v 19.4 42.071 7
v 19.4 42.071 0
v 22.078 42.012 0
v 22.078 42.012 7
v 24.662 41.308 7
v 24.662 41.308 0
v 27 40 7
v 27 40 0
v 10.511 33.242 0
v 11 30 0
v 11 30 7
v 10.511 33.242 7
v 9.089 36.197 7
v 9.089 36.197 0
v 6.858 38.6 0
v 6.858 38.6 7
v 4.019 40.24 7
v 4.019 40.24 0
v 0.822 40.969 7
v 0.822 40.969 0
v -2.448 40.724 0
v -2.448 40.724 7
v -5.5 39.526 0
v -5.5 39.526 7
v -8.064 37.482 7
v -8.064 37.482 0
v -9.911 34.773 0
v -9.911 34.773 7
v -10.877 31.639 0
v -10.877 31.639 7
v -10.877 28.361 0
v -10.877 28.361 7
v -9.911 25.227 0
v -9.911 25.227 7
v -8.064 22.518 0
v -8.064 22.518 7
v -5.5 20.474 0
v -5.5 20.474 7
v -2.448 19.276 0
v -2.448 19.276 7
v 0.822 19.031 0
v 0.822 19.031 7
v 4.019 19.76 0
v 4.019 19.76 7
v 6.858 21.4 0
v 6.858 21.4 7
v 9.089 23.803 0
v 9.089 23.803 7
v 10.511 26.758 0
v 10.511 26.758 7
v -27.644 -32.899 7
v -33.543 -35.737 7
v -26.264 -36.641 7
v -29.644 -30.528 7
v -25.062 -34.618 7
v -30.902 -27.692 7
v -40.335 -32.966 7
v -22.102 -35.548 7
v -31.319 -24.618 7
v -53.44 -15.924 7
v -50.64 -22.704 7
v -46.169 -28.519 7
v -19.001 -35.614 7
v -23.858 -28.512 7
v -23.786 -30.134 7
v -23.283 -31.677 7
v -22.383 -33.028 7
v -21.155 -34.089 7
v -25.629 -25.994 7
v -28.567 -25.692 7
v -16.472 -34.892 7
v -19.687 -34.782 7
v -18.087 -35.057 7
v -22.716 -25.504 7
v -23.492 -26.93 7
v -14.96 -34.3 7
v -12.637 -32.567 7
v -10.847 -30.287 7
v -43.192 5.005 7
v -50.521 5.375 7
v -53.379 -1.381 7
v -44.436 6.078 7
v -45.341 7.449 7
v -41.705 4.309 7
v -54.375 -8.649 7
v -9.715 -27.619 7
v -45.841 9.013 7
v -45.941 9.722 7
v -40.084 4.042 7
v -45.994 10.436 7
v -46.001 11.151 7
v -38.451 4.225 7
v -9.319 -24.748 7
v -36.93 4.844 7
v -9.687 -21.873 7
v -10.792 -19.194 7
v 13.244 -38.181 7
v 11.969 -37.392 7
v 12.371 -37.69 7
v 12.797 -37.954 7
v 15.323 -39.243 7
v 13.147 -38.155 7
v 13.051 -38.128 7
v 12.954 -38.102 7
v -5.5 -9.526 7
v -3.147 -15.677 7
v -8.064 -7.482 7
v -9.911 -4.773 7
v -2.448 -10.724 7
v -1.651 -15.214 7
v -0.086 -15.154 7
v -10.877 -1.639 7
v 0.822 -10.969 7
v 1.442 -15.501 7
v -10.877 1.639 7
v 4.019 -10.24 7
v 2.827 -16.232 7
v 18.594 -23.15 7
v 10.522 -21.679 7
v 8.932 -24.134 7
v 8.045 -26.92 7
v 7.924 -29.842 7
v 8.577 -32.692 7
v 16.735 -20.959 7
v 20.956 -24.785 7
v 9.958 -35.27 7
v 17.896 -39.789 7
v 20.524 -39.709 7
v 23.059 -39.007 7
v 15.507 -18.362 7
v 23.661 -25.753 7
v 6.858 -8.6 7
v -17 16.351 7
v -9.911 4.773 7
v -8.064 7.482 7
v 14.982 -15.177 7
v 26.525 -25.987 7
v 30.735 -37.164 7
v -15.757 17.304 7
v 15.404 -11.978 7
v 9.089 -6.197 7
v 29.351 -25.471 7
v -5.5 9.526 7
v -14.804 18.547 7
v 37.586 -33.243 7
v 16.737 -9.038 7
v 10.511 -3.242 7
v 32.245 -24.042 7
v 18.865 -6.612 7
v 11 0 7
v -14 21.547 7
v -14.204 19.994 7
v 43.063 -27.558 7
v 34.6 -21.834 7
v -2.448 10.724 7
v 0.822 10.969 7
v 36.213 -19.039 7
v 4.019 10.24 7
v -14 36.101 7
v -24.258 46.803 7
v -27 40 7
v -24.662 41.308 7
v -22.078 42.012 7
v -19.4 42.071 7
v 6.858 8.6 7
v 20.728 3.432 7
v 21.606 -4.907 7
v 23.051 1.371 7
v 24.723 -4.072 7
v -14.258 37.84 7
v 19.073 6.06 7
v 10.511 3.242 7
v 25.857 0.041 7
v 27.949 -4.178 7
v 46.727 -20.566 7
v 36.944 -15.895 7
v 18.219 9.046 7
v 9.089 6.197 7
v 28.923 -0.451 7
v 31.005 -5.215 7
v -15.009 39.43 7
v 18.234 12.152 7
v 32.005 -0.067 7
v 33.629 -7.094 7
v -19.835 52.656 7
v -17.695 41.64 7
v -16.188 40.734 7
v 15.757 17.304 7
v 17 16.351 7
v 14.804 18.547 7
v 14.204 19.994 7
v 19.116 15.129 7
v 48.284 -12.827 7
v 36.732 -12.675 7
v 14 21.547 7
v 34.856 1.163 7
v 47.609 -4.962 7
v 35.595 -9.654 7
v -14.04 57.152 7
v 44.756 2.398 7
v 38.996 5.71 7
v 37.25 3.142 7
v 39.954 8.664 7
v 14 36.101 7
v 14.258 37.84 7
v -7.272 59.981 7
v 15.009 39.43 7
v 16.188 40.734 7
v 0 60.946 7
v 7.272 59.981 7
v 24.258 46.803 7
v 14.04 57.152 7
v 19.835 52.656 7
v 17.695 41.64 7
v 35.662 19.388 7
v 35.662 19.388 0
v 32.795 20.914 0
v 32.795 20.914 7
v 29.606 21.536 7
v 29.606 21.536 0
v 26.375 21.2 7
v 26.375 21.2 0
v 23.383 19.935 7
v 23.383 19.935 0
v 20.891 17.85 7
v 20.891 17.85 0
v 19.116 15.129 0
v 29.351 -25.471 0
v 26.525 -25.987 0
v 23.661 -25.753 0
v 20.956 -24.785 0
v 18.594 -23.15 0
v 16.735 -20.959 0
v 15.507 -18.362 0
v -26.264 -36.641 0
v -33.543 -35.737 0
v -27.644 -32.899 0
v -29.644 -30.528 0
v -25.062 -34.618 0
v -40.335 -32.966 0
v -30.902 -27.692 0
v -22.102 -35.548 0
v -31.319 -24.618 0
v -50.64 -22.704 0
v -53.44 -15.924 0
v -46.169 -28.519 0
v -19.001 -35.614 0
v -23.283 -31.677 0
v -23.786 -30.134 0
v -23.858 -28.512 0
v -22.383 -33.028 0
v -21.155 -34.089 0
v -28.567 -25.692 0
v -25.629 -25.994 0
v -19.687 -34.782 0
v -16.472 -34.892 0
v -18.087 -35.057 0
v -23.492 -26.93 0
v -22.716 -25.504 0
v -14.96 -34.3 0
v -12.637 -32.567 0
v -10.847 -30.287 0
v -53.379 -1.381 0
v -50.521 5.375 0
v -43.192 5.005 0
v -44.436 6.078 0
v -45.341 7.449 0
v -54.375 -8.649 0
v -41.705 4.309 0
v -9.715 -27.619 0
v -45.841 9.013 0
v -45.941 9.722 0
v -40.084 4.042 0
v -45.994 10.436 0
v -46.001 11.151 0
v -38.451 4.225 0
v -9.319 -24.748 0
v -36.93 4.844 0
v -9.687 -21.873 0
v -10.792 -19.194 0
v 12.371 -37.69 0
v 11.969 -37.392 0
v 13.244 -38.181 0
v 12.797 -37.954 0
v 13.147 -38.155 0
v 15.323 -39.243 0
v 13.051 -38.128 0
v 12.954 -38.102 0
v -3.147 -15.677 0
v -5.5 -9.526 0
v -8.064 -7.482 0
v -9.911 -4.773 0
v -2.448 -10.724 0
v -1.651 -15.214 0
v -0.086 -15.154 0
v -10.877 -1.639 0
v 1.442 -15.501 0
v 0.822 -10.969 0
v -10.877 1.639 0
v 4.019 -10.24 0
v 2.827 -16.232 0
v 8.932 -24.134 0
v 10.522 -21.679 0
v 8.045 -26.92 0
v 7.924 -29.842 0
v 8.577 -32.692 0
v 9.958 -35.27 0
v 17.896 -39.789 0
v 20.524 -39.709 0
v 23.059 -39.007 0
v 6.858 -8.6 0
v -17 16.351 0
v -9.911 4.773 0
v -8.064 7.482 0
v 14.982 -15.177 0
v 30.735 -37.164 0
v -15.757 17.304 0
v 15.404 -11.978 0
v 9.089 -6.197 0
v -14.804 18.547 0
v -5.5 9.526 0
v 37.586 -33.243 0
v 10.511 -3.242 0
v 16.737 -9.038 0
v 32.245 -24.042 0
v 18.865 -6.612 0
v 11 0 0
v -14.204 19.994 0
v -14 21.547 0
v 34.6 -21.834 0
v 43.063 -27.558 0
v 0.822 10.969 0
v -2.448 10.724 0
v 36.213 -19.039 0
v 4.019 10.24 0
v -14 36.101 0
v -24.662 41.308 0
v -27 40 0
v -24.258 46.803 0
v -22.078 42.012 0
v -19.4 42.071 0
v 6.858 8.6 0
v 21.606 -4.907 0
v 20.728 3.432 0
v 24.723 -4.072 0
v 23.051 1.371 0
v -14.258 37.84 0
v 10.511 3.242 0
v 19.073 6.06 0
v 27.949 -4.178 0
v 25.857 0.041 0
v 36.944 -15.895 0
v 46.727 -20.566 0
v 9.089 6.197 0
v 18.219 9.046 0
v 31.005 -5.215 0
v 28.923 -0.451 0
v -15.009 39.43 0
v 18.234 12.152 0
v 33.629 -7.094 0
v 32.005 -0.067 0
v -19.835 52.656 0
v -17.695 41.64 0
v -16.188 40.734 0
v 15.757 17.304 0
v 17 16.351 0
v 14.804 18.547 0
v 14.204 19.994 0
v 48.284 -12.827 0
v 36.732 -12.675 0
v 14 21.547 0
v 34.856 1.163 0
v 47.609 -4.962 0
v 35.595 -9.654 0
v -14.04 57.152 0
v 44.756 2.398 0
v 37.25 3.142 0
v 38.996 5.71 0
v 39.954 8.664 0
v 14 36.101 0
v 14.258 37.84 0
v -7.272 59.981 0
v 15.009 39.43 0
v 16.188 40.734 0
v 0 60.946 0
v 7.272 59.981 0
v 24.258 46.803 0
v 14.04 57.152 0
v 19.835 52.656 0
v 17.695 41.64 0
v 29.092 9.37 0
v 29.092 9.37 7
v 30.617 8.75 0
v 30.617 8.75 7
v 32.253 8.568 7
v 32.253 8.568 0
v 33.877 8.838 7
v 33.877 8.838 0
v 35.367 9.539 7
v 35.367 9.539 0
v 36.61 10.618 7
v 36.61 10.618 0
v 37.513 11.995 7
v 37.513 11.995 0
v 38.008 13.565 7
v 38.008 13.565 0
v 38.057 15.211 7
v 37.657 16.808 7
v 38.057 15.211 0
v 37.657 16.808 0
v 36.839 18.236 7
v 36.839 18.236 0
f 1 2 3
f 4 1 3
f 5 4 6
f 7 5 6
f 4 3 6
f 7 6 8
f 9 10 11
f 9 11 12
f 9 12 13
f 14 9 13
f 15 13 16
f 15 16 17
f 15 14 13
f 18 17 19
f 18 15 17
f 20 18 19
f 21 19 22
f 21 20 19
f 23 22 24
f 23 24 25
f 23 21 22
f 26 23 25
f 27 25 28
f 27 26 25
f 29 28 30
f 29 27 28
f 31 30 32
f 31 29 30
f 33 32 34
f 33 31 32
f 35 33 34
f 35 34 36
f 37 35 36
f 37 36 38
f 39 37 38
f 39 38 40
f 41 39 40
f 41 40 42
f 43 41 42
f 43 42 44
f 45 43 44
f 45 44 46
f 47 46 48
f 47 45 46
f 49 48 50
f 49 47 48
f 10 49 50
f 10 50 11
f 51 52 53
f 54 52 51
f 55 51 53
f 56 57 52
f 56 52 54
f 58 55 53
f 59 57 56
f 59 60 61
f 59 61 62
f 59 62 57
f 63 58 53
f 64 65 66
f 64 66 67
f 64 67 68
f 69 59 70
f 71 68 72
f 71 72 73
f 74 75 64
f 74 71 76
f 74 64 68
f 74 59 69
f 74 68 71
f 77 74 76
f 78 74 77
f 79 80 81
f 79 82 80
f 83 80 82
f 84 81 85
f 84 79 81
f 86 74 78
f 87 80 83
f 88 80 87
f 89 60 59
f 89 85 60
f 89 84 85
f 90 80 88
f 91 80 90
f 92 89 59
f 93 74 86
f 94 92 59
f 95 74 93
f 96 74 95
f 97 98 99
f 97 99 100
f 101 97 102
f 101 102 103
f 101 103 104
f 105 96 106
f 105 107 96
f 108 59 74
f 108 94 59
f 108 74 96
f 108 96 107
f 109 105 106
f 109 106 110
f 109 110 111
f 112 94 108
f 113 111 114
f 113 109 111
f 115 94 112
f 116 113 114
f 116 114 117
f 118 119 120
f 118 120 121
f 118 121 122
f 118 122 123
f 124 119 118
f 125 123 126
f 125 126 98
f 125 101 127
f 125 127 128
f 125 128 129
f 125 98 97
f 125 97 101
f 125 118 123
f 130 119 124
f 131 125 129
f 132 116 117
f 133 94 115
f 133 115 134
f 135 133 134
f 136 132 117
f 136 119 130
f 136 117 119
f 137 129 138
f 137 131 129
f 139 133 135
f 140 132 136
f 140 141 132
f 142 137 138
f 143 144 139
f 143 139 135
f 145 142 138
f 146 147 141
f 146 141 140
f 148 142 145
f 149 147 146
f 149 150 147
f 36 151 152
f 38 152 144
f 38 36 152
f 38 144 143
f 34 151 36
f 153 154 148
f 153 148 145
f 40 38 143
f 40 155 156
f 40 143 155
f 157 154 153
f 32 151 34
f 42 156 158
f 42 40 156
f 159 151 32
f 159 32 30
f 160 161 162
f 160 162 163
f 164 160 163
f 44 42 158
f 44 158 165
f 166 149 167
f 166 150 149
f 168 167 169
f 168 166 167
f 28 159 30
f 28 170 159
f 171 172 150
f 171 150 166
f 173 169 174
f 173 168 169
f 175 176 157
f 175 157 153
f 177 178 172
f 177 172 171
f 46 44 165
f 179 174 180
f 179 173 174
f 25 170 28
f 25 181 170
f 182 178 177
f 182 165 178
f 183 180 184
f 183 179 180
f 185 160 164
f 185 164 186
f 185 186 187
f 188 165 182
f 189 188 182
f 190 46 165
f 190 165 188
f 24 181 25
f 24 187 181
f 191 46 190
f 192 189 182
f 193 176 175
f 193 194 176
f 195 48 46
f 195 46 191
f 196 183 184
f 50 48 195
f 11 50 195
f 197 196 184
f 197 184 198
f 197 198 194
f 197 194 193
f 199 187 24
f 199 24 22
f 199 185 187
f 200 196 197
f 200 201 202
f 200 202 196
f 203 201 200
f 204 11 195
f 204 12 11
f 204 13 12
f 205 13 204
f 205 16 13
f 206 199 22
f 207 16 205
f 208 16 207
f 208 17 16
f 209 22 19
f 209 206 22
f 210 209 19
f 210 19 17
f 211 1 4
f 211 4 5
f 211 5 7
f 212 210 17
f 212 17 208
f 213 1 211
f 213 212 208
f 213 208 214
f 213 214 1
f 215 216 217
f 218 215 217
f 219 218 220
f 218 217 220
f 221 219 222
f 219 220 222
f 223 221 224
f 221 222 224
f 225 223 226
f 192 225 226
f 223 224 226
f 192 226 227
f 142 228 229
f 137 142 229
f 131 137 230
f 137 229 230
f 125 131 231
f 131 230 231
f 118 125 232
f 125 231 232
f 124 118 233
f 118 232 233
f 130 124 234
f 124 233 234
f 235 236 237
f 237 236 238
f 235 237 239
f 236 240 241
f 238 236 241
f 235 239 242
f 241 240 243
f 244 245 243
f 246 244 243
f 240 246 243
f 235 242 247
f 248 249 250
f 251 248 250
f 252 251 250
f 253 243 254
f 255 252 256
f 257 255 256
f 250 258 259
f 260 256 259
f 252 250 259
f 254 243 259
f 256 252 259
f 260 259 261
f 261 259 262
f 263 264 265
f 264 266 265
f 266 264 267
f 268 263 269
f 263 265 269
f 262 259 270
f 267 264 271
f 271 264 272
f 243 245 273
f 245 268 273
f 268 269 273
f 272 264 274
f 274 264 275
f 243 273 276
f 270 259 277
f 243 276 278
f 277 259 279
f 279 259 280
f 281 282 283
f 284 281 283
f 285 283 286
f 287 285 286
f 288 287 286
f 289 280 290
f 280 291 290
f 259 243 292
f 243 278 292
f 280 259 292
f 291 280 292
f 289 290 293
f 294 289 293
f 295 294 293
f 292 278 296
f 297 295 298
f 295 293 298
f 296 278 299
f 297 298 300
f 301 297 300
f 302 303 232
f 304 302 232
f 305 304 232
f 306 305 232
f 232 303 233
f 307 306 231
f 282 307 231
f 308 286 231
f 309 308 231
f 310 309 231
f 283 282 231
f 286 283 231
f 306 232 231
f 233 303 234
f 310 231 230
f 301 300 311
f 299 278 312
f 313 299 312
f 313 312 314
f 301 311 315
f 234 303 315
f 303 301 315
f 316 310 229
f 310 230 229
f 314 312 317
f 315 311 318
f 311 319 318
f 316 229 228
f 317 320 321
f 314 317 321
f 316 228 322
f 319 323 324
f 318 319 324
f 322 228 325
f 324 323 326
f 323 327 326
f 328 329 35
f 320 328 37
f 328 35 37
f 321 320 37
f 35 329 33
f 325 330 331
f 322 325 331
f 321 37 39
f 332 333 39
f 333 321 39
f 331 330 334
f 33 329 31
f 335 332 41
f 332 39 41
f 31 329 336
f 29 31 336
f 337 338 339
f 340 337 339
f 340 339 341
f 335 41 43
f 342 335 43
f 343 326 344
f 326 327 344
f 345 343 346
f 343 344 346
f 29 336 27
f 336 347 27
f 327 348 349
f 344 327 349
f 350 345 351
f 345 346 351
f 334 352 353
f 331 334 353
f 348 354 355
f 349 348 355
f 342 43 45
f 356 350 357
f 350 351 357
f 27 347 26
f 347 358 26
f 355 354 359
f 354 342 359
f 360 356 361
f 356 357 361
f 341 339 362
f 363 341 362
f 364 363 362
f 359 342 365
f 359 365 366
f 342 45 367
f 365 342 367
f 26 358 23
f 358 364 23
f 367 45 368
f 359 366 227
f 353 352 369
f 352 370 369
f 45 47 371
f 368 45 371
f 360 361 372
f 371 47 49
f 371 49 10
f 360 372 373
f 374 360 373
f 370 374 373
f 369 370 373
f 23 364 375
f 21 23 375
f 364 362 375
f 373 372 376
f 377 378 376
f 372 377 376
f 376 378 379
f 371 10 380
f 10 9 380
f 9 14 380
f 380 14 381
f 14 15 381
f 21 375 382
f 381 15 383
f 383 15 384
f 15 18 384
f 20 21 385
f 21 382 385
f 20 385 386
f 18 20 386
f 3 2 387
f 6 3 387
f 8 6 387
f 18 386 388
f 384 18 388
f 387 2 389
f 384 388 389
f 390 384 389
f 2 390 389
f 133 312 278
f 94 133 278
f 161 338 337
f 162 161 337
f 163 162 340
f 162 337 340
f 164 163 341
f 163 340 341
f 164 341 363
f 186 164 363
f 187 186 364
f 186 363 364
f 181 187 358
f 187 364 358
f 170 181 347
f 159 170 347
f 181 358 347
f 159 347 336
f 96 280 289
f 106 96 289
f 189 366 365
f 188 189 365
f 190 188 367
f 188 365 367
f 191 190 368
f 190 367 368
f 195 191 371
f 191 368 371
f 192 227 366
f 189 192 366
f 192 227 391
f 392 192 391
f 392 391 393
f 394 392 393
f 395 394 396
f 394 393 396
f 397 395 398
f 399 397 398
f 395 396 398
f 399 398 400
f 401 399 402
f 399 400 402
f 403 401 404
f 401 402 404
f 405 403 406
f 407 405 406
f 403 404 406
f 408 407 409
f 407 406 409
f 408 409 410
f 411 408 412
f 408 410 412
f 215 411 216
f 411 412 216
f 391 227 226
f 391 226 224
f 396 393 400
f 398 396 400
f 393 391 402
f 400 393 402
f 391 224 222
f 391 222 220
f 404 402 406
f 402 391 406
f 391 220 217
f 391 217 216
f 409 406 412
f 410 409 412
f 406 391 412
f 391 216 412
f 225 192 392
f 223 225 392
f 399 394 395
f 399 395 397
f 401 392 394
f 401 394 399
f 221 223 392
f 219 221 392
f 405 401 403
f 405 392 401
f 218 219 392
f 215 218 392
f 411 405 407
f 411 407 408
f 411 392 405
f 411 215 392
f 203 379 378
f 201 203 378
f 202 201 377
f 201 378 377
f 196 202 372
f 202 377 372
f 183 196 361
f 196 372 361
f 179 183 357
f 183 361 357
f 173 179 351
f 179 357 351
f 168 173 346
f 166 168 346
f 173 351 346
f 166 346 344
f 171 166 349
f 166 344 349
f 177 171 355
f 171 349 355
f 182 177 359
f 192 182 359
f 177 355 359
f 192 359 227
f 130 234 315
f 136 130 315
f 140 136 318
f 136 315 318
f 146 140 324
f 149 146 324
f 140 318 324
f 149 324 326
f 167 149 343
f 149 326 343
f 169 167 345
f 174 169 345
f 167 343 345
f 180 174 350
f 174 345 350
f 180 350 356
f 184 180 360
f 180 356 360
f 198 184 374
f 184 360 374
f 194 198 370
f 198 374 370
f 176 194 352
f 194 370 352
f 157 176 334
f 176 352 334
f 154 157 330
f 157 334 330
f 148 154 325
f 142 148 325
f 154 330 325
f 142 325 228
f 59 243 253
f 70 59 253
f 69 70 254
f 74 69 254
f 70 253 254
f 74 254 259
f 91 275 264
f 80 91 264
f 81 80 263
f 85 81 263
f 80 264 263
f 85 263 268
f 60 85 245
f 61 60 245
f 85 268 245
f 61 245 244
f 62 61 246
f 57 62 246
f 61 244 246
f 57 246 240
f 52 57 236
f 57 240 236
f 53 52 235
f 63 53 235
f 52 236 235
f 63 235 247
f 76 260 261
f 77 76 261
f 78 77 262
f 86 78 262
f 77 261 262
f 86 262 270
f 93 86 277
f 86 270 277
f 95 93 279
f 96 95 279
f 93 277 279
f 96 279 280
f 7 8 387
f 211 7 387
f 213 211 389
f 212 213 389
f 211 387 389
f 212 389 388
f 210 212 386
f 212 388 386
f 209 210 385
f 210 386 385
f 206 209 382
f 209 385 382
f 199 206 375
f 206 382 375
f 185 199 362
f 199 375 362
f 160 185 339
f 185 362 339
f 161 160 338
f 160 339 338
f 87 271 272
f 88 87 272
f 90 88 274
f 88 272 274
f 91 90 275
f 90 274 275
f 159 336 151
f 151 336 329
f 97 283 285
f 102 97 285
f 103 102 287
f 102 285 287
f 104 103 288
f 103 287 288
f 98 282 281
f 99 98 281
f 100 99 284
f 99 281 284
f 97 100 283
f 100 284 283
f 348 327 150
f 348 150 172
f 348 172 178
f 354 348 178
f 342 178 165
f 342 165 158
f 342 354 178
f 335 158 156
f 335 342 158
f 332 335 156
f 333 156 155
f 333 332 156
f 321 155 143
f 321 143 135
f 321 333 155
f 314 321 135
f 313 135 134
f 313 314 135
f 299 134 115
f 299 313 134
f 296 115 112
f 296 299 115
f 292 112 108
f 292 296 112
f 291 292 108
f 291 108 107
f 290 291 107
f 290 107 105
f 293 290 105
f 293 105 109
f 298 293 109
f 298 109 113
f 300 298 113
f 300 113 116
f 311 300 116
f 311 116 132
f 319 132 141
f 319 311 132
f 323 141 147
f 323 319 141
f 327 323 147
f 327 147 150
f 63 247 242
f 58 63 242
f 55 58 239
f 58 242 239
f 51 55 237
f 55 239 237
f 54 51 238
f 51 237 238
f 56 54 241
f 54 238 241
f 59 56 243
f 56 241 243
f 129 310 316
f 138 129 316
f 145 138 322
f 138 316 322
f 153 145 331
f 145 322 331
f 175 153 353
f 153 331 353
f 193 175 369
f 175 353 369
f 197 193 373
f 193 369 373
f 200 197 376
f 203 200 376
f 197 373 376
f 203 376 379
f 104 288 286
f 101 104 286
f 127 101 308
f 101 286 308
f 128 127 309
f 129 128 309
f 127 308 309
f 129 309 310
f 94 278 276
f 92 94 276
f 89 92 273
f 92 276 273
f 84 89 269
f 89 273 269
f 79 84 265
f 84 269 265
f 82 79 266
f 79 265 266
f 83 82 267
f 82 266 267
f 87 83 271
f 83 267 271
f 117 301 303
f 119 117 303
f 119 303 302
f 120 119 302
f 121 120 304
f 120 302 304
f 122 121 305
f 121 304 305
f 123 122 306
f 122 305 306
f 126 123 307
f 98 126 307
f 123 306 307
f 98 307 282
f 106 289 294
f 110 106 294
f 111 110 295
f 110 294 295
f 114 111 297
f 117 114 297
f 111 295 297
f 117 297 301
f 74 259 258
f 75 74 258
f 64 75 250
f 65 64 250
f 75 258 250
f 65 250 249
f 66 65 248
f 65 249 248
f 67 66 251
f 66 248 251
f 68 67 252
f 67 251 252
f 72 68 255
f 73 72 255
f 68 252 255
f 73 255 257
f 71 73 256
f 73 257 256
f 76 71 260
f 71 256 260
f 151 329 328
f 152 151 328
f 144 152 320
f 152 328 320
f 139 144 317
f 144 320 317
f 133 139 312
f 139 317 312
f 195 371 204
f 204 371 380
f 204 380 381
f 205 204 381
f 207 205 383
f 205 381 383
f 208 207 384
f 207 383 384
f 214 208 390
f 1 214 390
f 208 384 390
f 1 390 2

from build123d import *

# Parameters (mm, degrees)
F0_R     = 11
F1_DEPTH = 7


# Not quite as in the source:
# - a feature of the source that left no trace in its solid (it failed there, or was rolled back) is left out


with BuildPart() as f1:
    # F0 (on Top) → F1 (new body)
    with BuildSketch(Plane.XY):
        with BuildLine():
            ThreePointArc((-14.9810198925, -15.0753065176), (-14.9808265585, -15.0376534794), (-14.9807621135, -15))
            ThreePointArc((-14.9807621135, -15), (-31.5612257999, -5.5206316115), (-31.3186575763, -24.6180492839))
            ThreePointArc((-31.3186575763, -24.6180492839), (-25.8668980567, -15.1949407788), (-14.9810198925, -15.0753065176))
        make_face()
        with BuildLine():
            ThreePointArc((-31.3186575763, -24.6180492839), (-31.5612257999, -5.5206316115), (-14.9807621135, -15))
            ThreePointArc((-14.9807621135, -15), (-14.9808265585, -15.0376534794), (-14.9810198925, -15.0753065176))
            ThreePointArc((-14.9810198925, -15.0753065176), (-12.6066127008, -16.8498624622), (-10.7922626222, -19.1940024121))
            Line((-10.7922626222, -19.1940024121), (-3.1471315948, -15.6774235403))
            ThreePointArc((-3.1471315948, -15.6774235403), (-0.0857175759, -15.1540545193), (2.8272292465, -16.231510661))
            Line((2.8272292465, -16.231510661), (10.5215510319, -21.6791304199))
            ThreePointArc((10.5215510319, -21.6791304199), (12.7842474134, -19.6747261792), (15.5070984162, -18.3618995755))
            ThreePointArc((15.5070984162, -18.3618995755), (24.2793363394, -4.1323806501), (36.9807621135, -15))
            ThreePointArc((36.9807621135, -15), (34.8711182406, -21.4777749215), (29.3513861257, -25.470859266))
            ThreePointArc((29.3513861257, -25.470859266), (28.8526132199, -33.4697356256), (23.0588387456, -39.0071515183))
            ThreePointArc((23.0588387456, -39.0071515183), (46.7268088994, -20.5659720475), (39.9540974013, 8.6638122562))
            ThreePointArc((39.9540974013, 8.6638122562), (25.8569369314, 0.0414243654), (19.1161667268, 15.1290856588))
            Line((19.1161667268, 15.1290856588), (17, 16.3508550882))
            ThreePointArc((17, 16.3508550882), (14.8038475773, 18.5470075109), (14, 21.5470075109))
            Line((14, 21.5470075109), (14, 36.1008175109))
            ThreePointArc((14, 36.1008175109), (15.5502809077, 40.1257398704), (19.4, 42.0707421335))
            ThreePointArc((19.4, 42.0707421335), (23.3917111277, 41.73898575), (27, 40))
            ThreePointArc((27, 40), (0, 60.9456692242), (-27, 40))
            ThreePointArc((-27, 40), (-23.3917111277, 41.73898575), (-19.4, 42.0707421335))
            ThreePointArc((-19.4, 42.0707421335), (-15.5502809077, 40.1257398704), (-14, 36.1008175109))
            Line((-14, 36.1008175109), (-14, 21.5470075109))
            ThreePointArc((-14, 21.5470075109), (-14.8038475773, 18.5470075109), (-17, 16.3508550882))
            Line((-17, 16.3508550882), (-36.9299341095, 4.8443022651))
            ThreePointArc((-36.9299341095, 4.8443022651), (-42.4725061765, 4.6058132751), (-45.8413922703, 9.0134871064))
            ThreePointArc((-45.8413922703, 9.0134871064), (-45.9732793063, 10.0784919978), (-46.000762454, 11.1512800876))
            ThreePointArc((-46.000762454, 11.1512800876), (-50.6402441015, -22.7042404267), (-19.000762454, -35.6140917168))
            ThreePointArc((-19.000762454, -35.6140917168), (-27.6443184319, -32.8993578589), (-31.3186575763, -24.6180492839))
        make_face()
        Circle(F0_R, mode=Mode.SUBTRACT)
        with Locations((0, 30)):
            Circle(F0_R, mode=Mode.SUBTRACT)
        with BuildLine():
            ThreePointArc((-14.9810198925, -15.0753065176), (-25.8668980567, -15.1949407788), (-31.3186575763, -24.6180492839))
            ThreePointArc((-31.3186575763, -24.6180492839), (-27.1082014874, -25.9420692951), (-22.7162279438, -25.5044189109))
            ThreePointArc((-22.7162279438, -25.5044189109), (-21.6737707093, -24.4089875601), (-20.3905407876, -23.6089826237))
            Line((-20.3905407876, -23.6089826237), (-17.9001022816, -22.4634400032))
            ThreePointArc((-17.9001022816, -22.4634400032), (-15.7503386264, -19.0420830366), (-14.9810198925, -15.0753065176))
        make_face()
        with BuildLine():
            ThreePointArc((-10.7922626222, -19.1940024121), (-12.6066127008, -16.8498624622), (-14.9810198925, -15.0753065176))
            ThreePointArc((-14.9810198925, -15.0753065176), (-15.7503386264, -19.0420830366), (-17.9001022816, -22.4634400032))
            Line((-17.9001022816, -22.4634400032), (-10.7922626222, -19.1940024121))
        make_face()
        with BuildLine():
            ThreePointArc((-20.3905407876, -23.6089826237), (-21.6737707093, -24.4089875601), (-22.7162279438, -25.5044189109))
            ThreePointArc((-22.7162279438, -25.5044189109), (-20.1079225182, -24.3010620408), (-17.9001022816, -22.4634400032))
            Line((-17.9001022816, -22.4634400032), (-20.3905407876, -23.6089826237))
        make_face()
        with BuildLine():
            ThreePointArc((-17.9001022816, -22.4634400032), (-20.1079225182, -24.3010620408), (-22.7162279438, -25.5044189109))
            ThreePointArc((-22.7162279438, -25.5044189109), (-22.3834789255, -33.0283008678), (-14.9603721303, -34.299916815))
            ThreePointArc((-14.9603721303, -34.299916815), (-9.7151694528, -27.619201463), (-10.7922626222, -19.1940024121))
            Line((-10.7922626222, -19.1940024121), (-17.9001022816, -22.4634400032))
        make_face()
        with BuildLine():
            ThreePointArc((15.5070984162, -18.3618995755), (12.7842474134, -19.6747261792), (10.5215510319, -21.6791304199))
            Line((10.5215510319, -21.6791304199), (19.2043932568, -27.8266277806))
            ThreePointArc((19.2043932568, -27.8266277806), (21.4514676336, -34.5535505425), (15.7145306517, -38.7234890511))
            ThreePointArc((15.7145306517, -38.7234890511), (19.3772945803, -39.1084399418), (23.0588387456, -39.0071515183))
            ThreePointArc((23.0588387456, -39.0071515183), (28.8526132199, -33.4697356256), (29.3513861257, -25.470859266))
            ThreePointArc((29.3513861257, -25.470859266), (20.9560611112, -24.7853144986), (15.5070984162, -18.3618995755))
        make_face()
        with BuildLine():
            Line((19.2043932568, -27.8266277806), (10.5215510319, -21.6791304199))
            ThreePointArc((10.5215510319, -21.6791304199), (7.9240920964, -29.8417100549), (11.968923576, -37.3924608467))
            ThreePointArc((11.968923576, -37.3924608467), (12.5815553416, -37.8265611192), (13.2436070612, -38.1807478602))
            ThreePointArc((13.2436070612, -38.1807478602), (14.4729085443, -38.4801643471), (15.7145306517, -38.7234890511))
            ThreePointArc((15.7145306517, -38.7234890511), (21.4514676336, -34.5535505425), (19.2043932568, -27.8266277806))
        make_face()
        with BuildLine():
            ThreePointArc((13.2436070612, -38.1807478602), (14.450138713, -38.5838279613), (15.7145306517, -38.7234890511))
            ThreePointArc((15.7145306517, -38.7234890511), (14.4729085443, -38.4801643471), (13.2436070612, -38.1807478602))
        make_face()
        with BuildLine():
            ThreePointArc((23.0588387456, -39.0071515183), (19.3772945803, -39.1084399418), (15.7145306517, -38.7234890511))
            ThreePointArc((15.7145306517, -38.7234890511), (14.450138713, -38.5838279613), (13.2436070612, -38.1807478602))
            ThreePointArc((13.2436070612, -38.1807478602), (13.0987456479, -38.1415433693), (12.9540974013, -38.1015595481))
            ThreePointArc((12.9540974013, -38.1015595481), (17.8958322334, -39.7888480911), (23.0588387456, -39.0071515183))
        make_face()
    extrude(amount=F1_DEPTH)


with BuildPart() as f1b:
    # F0 (on Top) → F1, piece 2 (new body)
    with BuildSketch(Plane.XY):
        with BuildLine():
            ThreePointArc((35.6622980234, 19.3878045659), (26.3746934117, 21.2001691989), (19.1161667268, 15.1290856588))
            Line((19.1161667268, 15.1290856588), (29.0918954701, 9.3695959835))
            ThreePointArc((29.0918954701, 9.3695959835), (37.1091123847, 11.2752264975), (35.6622980234, 19.3878045659))
        make_face()
    extrude(amount=F1_DEPTH)


solid = Compound([f1.part, f1b.part])
